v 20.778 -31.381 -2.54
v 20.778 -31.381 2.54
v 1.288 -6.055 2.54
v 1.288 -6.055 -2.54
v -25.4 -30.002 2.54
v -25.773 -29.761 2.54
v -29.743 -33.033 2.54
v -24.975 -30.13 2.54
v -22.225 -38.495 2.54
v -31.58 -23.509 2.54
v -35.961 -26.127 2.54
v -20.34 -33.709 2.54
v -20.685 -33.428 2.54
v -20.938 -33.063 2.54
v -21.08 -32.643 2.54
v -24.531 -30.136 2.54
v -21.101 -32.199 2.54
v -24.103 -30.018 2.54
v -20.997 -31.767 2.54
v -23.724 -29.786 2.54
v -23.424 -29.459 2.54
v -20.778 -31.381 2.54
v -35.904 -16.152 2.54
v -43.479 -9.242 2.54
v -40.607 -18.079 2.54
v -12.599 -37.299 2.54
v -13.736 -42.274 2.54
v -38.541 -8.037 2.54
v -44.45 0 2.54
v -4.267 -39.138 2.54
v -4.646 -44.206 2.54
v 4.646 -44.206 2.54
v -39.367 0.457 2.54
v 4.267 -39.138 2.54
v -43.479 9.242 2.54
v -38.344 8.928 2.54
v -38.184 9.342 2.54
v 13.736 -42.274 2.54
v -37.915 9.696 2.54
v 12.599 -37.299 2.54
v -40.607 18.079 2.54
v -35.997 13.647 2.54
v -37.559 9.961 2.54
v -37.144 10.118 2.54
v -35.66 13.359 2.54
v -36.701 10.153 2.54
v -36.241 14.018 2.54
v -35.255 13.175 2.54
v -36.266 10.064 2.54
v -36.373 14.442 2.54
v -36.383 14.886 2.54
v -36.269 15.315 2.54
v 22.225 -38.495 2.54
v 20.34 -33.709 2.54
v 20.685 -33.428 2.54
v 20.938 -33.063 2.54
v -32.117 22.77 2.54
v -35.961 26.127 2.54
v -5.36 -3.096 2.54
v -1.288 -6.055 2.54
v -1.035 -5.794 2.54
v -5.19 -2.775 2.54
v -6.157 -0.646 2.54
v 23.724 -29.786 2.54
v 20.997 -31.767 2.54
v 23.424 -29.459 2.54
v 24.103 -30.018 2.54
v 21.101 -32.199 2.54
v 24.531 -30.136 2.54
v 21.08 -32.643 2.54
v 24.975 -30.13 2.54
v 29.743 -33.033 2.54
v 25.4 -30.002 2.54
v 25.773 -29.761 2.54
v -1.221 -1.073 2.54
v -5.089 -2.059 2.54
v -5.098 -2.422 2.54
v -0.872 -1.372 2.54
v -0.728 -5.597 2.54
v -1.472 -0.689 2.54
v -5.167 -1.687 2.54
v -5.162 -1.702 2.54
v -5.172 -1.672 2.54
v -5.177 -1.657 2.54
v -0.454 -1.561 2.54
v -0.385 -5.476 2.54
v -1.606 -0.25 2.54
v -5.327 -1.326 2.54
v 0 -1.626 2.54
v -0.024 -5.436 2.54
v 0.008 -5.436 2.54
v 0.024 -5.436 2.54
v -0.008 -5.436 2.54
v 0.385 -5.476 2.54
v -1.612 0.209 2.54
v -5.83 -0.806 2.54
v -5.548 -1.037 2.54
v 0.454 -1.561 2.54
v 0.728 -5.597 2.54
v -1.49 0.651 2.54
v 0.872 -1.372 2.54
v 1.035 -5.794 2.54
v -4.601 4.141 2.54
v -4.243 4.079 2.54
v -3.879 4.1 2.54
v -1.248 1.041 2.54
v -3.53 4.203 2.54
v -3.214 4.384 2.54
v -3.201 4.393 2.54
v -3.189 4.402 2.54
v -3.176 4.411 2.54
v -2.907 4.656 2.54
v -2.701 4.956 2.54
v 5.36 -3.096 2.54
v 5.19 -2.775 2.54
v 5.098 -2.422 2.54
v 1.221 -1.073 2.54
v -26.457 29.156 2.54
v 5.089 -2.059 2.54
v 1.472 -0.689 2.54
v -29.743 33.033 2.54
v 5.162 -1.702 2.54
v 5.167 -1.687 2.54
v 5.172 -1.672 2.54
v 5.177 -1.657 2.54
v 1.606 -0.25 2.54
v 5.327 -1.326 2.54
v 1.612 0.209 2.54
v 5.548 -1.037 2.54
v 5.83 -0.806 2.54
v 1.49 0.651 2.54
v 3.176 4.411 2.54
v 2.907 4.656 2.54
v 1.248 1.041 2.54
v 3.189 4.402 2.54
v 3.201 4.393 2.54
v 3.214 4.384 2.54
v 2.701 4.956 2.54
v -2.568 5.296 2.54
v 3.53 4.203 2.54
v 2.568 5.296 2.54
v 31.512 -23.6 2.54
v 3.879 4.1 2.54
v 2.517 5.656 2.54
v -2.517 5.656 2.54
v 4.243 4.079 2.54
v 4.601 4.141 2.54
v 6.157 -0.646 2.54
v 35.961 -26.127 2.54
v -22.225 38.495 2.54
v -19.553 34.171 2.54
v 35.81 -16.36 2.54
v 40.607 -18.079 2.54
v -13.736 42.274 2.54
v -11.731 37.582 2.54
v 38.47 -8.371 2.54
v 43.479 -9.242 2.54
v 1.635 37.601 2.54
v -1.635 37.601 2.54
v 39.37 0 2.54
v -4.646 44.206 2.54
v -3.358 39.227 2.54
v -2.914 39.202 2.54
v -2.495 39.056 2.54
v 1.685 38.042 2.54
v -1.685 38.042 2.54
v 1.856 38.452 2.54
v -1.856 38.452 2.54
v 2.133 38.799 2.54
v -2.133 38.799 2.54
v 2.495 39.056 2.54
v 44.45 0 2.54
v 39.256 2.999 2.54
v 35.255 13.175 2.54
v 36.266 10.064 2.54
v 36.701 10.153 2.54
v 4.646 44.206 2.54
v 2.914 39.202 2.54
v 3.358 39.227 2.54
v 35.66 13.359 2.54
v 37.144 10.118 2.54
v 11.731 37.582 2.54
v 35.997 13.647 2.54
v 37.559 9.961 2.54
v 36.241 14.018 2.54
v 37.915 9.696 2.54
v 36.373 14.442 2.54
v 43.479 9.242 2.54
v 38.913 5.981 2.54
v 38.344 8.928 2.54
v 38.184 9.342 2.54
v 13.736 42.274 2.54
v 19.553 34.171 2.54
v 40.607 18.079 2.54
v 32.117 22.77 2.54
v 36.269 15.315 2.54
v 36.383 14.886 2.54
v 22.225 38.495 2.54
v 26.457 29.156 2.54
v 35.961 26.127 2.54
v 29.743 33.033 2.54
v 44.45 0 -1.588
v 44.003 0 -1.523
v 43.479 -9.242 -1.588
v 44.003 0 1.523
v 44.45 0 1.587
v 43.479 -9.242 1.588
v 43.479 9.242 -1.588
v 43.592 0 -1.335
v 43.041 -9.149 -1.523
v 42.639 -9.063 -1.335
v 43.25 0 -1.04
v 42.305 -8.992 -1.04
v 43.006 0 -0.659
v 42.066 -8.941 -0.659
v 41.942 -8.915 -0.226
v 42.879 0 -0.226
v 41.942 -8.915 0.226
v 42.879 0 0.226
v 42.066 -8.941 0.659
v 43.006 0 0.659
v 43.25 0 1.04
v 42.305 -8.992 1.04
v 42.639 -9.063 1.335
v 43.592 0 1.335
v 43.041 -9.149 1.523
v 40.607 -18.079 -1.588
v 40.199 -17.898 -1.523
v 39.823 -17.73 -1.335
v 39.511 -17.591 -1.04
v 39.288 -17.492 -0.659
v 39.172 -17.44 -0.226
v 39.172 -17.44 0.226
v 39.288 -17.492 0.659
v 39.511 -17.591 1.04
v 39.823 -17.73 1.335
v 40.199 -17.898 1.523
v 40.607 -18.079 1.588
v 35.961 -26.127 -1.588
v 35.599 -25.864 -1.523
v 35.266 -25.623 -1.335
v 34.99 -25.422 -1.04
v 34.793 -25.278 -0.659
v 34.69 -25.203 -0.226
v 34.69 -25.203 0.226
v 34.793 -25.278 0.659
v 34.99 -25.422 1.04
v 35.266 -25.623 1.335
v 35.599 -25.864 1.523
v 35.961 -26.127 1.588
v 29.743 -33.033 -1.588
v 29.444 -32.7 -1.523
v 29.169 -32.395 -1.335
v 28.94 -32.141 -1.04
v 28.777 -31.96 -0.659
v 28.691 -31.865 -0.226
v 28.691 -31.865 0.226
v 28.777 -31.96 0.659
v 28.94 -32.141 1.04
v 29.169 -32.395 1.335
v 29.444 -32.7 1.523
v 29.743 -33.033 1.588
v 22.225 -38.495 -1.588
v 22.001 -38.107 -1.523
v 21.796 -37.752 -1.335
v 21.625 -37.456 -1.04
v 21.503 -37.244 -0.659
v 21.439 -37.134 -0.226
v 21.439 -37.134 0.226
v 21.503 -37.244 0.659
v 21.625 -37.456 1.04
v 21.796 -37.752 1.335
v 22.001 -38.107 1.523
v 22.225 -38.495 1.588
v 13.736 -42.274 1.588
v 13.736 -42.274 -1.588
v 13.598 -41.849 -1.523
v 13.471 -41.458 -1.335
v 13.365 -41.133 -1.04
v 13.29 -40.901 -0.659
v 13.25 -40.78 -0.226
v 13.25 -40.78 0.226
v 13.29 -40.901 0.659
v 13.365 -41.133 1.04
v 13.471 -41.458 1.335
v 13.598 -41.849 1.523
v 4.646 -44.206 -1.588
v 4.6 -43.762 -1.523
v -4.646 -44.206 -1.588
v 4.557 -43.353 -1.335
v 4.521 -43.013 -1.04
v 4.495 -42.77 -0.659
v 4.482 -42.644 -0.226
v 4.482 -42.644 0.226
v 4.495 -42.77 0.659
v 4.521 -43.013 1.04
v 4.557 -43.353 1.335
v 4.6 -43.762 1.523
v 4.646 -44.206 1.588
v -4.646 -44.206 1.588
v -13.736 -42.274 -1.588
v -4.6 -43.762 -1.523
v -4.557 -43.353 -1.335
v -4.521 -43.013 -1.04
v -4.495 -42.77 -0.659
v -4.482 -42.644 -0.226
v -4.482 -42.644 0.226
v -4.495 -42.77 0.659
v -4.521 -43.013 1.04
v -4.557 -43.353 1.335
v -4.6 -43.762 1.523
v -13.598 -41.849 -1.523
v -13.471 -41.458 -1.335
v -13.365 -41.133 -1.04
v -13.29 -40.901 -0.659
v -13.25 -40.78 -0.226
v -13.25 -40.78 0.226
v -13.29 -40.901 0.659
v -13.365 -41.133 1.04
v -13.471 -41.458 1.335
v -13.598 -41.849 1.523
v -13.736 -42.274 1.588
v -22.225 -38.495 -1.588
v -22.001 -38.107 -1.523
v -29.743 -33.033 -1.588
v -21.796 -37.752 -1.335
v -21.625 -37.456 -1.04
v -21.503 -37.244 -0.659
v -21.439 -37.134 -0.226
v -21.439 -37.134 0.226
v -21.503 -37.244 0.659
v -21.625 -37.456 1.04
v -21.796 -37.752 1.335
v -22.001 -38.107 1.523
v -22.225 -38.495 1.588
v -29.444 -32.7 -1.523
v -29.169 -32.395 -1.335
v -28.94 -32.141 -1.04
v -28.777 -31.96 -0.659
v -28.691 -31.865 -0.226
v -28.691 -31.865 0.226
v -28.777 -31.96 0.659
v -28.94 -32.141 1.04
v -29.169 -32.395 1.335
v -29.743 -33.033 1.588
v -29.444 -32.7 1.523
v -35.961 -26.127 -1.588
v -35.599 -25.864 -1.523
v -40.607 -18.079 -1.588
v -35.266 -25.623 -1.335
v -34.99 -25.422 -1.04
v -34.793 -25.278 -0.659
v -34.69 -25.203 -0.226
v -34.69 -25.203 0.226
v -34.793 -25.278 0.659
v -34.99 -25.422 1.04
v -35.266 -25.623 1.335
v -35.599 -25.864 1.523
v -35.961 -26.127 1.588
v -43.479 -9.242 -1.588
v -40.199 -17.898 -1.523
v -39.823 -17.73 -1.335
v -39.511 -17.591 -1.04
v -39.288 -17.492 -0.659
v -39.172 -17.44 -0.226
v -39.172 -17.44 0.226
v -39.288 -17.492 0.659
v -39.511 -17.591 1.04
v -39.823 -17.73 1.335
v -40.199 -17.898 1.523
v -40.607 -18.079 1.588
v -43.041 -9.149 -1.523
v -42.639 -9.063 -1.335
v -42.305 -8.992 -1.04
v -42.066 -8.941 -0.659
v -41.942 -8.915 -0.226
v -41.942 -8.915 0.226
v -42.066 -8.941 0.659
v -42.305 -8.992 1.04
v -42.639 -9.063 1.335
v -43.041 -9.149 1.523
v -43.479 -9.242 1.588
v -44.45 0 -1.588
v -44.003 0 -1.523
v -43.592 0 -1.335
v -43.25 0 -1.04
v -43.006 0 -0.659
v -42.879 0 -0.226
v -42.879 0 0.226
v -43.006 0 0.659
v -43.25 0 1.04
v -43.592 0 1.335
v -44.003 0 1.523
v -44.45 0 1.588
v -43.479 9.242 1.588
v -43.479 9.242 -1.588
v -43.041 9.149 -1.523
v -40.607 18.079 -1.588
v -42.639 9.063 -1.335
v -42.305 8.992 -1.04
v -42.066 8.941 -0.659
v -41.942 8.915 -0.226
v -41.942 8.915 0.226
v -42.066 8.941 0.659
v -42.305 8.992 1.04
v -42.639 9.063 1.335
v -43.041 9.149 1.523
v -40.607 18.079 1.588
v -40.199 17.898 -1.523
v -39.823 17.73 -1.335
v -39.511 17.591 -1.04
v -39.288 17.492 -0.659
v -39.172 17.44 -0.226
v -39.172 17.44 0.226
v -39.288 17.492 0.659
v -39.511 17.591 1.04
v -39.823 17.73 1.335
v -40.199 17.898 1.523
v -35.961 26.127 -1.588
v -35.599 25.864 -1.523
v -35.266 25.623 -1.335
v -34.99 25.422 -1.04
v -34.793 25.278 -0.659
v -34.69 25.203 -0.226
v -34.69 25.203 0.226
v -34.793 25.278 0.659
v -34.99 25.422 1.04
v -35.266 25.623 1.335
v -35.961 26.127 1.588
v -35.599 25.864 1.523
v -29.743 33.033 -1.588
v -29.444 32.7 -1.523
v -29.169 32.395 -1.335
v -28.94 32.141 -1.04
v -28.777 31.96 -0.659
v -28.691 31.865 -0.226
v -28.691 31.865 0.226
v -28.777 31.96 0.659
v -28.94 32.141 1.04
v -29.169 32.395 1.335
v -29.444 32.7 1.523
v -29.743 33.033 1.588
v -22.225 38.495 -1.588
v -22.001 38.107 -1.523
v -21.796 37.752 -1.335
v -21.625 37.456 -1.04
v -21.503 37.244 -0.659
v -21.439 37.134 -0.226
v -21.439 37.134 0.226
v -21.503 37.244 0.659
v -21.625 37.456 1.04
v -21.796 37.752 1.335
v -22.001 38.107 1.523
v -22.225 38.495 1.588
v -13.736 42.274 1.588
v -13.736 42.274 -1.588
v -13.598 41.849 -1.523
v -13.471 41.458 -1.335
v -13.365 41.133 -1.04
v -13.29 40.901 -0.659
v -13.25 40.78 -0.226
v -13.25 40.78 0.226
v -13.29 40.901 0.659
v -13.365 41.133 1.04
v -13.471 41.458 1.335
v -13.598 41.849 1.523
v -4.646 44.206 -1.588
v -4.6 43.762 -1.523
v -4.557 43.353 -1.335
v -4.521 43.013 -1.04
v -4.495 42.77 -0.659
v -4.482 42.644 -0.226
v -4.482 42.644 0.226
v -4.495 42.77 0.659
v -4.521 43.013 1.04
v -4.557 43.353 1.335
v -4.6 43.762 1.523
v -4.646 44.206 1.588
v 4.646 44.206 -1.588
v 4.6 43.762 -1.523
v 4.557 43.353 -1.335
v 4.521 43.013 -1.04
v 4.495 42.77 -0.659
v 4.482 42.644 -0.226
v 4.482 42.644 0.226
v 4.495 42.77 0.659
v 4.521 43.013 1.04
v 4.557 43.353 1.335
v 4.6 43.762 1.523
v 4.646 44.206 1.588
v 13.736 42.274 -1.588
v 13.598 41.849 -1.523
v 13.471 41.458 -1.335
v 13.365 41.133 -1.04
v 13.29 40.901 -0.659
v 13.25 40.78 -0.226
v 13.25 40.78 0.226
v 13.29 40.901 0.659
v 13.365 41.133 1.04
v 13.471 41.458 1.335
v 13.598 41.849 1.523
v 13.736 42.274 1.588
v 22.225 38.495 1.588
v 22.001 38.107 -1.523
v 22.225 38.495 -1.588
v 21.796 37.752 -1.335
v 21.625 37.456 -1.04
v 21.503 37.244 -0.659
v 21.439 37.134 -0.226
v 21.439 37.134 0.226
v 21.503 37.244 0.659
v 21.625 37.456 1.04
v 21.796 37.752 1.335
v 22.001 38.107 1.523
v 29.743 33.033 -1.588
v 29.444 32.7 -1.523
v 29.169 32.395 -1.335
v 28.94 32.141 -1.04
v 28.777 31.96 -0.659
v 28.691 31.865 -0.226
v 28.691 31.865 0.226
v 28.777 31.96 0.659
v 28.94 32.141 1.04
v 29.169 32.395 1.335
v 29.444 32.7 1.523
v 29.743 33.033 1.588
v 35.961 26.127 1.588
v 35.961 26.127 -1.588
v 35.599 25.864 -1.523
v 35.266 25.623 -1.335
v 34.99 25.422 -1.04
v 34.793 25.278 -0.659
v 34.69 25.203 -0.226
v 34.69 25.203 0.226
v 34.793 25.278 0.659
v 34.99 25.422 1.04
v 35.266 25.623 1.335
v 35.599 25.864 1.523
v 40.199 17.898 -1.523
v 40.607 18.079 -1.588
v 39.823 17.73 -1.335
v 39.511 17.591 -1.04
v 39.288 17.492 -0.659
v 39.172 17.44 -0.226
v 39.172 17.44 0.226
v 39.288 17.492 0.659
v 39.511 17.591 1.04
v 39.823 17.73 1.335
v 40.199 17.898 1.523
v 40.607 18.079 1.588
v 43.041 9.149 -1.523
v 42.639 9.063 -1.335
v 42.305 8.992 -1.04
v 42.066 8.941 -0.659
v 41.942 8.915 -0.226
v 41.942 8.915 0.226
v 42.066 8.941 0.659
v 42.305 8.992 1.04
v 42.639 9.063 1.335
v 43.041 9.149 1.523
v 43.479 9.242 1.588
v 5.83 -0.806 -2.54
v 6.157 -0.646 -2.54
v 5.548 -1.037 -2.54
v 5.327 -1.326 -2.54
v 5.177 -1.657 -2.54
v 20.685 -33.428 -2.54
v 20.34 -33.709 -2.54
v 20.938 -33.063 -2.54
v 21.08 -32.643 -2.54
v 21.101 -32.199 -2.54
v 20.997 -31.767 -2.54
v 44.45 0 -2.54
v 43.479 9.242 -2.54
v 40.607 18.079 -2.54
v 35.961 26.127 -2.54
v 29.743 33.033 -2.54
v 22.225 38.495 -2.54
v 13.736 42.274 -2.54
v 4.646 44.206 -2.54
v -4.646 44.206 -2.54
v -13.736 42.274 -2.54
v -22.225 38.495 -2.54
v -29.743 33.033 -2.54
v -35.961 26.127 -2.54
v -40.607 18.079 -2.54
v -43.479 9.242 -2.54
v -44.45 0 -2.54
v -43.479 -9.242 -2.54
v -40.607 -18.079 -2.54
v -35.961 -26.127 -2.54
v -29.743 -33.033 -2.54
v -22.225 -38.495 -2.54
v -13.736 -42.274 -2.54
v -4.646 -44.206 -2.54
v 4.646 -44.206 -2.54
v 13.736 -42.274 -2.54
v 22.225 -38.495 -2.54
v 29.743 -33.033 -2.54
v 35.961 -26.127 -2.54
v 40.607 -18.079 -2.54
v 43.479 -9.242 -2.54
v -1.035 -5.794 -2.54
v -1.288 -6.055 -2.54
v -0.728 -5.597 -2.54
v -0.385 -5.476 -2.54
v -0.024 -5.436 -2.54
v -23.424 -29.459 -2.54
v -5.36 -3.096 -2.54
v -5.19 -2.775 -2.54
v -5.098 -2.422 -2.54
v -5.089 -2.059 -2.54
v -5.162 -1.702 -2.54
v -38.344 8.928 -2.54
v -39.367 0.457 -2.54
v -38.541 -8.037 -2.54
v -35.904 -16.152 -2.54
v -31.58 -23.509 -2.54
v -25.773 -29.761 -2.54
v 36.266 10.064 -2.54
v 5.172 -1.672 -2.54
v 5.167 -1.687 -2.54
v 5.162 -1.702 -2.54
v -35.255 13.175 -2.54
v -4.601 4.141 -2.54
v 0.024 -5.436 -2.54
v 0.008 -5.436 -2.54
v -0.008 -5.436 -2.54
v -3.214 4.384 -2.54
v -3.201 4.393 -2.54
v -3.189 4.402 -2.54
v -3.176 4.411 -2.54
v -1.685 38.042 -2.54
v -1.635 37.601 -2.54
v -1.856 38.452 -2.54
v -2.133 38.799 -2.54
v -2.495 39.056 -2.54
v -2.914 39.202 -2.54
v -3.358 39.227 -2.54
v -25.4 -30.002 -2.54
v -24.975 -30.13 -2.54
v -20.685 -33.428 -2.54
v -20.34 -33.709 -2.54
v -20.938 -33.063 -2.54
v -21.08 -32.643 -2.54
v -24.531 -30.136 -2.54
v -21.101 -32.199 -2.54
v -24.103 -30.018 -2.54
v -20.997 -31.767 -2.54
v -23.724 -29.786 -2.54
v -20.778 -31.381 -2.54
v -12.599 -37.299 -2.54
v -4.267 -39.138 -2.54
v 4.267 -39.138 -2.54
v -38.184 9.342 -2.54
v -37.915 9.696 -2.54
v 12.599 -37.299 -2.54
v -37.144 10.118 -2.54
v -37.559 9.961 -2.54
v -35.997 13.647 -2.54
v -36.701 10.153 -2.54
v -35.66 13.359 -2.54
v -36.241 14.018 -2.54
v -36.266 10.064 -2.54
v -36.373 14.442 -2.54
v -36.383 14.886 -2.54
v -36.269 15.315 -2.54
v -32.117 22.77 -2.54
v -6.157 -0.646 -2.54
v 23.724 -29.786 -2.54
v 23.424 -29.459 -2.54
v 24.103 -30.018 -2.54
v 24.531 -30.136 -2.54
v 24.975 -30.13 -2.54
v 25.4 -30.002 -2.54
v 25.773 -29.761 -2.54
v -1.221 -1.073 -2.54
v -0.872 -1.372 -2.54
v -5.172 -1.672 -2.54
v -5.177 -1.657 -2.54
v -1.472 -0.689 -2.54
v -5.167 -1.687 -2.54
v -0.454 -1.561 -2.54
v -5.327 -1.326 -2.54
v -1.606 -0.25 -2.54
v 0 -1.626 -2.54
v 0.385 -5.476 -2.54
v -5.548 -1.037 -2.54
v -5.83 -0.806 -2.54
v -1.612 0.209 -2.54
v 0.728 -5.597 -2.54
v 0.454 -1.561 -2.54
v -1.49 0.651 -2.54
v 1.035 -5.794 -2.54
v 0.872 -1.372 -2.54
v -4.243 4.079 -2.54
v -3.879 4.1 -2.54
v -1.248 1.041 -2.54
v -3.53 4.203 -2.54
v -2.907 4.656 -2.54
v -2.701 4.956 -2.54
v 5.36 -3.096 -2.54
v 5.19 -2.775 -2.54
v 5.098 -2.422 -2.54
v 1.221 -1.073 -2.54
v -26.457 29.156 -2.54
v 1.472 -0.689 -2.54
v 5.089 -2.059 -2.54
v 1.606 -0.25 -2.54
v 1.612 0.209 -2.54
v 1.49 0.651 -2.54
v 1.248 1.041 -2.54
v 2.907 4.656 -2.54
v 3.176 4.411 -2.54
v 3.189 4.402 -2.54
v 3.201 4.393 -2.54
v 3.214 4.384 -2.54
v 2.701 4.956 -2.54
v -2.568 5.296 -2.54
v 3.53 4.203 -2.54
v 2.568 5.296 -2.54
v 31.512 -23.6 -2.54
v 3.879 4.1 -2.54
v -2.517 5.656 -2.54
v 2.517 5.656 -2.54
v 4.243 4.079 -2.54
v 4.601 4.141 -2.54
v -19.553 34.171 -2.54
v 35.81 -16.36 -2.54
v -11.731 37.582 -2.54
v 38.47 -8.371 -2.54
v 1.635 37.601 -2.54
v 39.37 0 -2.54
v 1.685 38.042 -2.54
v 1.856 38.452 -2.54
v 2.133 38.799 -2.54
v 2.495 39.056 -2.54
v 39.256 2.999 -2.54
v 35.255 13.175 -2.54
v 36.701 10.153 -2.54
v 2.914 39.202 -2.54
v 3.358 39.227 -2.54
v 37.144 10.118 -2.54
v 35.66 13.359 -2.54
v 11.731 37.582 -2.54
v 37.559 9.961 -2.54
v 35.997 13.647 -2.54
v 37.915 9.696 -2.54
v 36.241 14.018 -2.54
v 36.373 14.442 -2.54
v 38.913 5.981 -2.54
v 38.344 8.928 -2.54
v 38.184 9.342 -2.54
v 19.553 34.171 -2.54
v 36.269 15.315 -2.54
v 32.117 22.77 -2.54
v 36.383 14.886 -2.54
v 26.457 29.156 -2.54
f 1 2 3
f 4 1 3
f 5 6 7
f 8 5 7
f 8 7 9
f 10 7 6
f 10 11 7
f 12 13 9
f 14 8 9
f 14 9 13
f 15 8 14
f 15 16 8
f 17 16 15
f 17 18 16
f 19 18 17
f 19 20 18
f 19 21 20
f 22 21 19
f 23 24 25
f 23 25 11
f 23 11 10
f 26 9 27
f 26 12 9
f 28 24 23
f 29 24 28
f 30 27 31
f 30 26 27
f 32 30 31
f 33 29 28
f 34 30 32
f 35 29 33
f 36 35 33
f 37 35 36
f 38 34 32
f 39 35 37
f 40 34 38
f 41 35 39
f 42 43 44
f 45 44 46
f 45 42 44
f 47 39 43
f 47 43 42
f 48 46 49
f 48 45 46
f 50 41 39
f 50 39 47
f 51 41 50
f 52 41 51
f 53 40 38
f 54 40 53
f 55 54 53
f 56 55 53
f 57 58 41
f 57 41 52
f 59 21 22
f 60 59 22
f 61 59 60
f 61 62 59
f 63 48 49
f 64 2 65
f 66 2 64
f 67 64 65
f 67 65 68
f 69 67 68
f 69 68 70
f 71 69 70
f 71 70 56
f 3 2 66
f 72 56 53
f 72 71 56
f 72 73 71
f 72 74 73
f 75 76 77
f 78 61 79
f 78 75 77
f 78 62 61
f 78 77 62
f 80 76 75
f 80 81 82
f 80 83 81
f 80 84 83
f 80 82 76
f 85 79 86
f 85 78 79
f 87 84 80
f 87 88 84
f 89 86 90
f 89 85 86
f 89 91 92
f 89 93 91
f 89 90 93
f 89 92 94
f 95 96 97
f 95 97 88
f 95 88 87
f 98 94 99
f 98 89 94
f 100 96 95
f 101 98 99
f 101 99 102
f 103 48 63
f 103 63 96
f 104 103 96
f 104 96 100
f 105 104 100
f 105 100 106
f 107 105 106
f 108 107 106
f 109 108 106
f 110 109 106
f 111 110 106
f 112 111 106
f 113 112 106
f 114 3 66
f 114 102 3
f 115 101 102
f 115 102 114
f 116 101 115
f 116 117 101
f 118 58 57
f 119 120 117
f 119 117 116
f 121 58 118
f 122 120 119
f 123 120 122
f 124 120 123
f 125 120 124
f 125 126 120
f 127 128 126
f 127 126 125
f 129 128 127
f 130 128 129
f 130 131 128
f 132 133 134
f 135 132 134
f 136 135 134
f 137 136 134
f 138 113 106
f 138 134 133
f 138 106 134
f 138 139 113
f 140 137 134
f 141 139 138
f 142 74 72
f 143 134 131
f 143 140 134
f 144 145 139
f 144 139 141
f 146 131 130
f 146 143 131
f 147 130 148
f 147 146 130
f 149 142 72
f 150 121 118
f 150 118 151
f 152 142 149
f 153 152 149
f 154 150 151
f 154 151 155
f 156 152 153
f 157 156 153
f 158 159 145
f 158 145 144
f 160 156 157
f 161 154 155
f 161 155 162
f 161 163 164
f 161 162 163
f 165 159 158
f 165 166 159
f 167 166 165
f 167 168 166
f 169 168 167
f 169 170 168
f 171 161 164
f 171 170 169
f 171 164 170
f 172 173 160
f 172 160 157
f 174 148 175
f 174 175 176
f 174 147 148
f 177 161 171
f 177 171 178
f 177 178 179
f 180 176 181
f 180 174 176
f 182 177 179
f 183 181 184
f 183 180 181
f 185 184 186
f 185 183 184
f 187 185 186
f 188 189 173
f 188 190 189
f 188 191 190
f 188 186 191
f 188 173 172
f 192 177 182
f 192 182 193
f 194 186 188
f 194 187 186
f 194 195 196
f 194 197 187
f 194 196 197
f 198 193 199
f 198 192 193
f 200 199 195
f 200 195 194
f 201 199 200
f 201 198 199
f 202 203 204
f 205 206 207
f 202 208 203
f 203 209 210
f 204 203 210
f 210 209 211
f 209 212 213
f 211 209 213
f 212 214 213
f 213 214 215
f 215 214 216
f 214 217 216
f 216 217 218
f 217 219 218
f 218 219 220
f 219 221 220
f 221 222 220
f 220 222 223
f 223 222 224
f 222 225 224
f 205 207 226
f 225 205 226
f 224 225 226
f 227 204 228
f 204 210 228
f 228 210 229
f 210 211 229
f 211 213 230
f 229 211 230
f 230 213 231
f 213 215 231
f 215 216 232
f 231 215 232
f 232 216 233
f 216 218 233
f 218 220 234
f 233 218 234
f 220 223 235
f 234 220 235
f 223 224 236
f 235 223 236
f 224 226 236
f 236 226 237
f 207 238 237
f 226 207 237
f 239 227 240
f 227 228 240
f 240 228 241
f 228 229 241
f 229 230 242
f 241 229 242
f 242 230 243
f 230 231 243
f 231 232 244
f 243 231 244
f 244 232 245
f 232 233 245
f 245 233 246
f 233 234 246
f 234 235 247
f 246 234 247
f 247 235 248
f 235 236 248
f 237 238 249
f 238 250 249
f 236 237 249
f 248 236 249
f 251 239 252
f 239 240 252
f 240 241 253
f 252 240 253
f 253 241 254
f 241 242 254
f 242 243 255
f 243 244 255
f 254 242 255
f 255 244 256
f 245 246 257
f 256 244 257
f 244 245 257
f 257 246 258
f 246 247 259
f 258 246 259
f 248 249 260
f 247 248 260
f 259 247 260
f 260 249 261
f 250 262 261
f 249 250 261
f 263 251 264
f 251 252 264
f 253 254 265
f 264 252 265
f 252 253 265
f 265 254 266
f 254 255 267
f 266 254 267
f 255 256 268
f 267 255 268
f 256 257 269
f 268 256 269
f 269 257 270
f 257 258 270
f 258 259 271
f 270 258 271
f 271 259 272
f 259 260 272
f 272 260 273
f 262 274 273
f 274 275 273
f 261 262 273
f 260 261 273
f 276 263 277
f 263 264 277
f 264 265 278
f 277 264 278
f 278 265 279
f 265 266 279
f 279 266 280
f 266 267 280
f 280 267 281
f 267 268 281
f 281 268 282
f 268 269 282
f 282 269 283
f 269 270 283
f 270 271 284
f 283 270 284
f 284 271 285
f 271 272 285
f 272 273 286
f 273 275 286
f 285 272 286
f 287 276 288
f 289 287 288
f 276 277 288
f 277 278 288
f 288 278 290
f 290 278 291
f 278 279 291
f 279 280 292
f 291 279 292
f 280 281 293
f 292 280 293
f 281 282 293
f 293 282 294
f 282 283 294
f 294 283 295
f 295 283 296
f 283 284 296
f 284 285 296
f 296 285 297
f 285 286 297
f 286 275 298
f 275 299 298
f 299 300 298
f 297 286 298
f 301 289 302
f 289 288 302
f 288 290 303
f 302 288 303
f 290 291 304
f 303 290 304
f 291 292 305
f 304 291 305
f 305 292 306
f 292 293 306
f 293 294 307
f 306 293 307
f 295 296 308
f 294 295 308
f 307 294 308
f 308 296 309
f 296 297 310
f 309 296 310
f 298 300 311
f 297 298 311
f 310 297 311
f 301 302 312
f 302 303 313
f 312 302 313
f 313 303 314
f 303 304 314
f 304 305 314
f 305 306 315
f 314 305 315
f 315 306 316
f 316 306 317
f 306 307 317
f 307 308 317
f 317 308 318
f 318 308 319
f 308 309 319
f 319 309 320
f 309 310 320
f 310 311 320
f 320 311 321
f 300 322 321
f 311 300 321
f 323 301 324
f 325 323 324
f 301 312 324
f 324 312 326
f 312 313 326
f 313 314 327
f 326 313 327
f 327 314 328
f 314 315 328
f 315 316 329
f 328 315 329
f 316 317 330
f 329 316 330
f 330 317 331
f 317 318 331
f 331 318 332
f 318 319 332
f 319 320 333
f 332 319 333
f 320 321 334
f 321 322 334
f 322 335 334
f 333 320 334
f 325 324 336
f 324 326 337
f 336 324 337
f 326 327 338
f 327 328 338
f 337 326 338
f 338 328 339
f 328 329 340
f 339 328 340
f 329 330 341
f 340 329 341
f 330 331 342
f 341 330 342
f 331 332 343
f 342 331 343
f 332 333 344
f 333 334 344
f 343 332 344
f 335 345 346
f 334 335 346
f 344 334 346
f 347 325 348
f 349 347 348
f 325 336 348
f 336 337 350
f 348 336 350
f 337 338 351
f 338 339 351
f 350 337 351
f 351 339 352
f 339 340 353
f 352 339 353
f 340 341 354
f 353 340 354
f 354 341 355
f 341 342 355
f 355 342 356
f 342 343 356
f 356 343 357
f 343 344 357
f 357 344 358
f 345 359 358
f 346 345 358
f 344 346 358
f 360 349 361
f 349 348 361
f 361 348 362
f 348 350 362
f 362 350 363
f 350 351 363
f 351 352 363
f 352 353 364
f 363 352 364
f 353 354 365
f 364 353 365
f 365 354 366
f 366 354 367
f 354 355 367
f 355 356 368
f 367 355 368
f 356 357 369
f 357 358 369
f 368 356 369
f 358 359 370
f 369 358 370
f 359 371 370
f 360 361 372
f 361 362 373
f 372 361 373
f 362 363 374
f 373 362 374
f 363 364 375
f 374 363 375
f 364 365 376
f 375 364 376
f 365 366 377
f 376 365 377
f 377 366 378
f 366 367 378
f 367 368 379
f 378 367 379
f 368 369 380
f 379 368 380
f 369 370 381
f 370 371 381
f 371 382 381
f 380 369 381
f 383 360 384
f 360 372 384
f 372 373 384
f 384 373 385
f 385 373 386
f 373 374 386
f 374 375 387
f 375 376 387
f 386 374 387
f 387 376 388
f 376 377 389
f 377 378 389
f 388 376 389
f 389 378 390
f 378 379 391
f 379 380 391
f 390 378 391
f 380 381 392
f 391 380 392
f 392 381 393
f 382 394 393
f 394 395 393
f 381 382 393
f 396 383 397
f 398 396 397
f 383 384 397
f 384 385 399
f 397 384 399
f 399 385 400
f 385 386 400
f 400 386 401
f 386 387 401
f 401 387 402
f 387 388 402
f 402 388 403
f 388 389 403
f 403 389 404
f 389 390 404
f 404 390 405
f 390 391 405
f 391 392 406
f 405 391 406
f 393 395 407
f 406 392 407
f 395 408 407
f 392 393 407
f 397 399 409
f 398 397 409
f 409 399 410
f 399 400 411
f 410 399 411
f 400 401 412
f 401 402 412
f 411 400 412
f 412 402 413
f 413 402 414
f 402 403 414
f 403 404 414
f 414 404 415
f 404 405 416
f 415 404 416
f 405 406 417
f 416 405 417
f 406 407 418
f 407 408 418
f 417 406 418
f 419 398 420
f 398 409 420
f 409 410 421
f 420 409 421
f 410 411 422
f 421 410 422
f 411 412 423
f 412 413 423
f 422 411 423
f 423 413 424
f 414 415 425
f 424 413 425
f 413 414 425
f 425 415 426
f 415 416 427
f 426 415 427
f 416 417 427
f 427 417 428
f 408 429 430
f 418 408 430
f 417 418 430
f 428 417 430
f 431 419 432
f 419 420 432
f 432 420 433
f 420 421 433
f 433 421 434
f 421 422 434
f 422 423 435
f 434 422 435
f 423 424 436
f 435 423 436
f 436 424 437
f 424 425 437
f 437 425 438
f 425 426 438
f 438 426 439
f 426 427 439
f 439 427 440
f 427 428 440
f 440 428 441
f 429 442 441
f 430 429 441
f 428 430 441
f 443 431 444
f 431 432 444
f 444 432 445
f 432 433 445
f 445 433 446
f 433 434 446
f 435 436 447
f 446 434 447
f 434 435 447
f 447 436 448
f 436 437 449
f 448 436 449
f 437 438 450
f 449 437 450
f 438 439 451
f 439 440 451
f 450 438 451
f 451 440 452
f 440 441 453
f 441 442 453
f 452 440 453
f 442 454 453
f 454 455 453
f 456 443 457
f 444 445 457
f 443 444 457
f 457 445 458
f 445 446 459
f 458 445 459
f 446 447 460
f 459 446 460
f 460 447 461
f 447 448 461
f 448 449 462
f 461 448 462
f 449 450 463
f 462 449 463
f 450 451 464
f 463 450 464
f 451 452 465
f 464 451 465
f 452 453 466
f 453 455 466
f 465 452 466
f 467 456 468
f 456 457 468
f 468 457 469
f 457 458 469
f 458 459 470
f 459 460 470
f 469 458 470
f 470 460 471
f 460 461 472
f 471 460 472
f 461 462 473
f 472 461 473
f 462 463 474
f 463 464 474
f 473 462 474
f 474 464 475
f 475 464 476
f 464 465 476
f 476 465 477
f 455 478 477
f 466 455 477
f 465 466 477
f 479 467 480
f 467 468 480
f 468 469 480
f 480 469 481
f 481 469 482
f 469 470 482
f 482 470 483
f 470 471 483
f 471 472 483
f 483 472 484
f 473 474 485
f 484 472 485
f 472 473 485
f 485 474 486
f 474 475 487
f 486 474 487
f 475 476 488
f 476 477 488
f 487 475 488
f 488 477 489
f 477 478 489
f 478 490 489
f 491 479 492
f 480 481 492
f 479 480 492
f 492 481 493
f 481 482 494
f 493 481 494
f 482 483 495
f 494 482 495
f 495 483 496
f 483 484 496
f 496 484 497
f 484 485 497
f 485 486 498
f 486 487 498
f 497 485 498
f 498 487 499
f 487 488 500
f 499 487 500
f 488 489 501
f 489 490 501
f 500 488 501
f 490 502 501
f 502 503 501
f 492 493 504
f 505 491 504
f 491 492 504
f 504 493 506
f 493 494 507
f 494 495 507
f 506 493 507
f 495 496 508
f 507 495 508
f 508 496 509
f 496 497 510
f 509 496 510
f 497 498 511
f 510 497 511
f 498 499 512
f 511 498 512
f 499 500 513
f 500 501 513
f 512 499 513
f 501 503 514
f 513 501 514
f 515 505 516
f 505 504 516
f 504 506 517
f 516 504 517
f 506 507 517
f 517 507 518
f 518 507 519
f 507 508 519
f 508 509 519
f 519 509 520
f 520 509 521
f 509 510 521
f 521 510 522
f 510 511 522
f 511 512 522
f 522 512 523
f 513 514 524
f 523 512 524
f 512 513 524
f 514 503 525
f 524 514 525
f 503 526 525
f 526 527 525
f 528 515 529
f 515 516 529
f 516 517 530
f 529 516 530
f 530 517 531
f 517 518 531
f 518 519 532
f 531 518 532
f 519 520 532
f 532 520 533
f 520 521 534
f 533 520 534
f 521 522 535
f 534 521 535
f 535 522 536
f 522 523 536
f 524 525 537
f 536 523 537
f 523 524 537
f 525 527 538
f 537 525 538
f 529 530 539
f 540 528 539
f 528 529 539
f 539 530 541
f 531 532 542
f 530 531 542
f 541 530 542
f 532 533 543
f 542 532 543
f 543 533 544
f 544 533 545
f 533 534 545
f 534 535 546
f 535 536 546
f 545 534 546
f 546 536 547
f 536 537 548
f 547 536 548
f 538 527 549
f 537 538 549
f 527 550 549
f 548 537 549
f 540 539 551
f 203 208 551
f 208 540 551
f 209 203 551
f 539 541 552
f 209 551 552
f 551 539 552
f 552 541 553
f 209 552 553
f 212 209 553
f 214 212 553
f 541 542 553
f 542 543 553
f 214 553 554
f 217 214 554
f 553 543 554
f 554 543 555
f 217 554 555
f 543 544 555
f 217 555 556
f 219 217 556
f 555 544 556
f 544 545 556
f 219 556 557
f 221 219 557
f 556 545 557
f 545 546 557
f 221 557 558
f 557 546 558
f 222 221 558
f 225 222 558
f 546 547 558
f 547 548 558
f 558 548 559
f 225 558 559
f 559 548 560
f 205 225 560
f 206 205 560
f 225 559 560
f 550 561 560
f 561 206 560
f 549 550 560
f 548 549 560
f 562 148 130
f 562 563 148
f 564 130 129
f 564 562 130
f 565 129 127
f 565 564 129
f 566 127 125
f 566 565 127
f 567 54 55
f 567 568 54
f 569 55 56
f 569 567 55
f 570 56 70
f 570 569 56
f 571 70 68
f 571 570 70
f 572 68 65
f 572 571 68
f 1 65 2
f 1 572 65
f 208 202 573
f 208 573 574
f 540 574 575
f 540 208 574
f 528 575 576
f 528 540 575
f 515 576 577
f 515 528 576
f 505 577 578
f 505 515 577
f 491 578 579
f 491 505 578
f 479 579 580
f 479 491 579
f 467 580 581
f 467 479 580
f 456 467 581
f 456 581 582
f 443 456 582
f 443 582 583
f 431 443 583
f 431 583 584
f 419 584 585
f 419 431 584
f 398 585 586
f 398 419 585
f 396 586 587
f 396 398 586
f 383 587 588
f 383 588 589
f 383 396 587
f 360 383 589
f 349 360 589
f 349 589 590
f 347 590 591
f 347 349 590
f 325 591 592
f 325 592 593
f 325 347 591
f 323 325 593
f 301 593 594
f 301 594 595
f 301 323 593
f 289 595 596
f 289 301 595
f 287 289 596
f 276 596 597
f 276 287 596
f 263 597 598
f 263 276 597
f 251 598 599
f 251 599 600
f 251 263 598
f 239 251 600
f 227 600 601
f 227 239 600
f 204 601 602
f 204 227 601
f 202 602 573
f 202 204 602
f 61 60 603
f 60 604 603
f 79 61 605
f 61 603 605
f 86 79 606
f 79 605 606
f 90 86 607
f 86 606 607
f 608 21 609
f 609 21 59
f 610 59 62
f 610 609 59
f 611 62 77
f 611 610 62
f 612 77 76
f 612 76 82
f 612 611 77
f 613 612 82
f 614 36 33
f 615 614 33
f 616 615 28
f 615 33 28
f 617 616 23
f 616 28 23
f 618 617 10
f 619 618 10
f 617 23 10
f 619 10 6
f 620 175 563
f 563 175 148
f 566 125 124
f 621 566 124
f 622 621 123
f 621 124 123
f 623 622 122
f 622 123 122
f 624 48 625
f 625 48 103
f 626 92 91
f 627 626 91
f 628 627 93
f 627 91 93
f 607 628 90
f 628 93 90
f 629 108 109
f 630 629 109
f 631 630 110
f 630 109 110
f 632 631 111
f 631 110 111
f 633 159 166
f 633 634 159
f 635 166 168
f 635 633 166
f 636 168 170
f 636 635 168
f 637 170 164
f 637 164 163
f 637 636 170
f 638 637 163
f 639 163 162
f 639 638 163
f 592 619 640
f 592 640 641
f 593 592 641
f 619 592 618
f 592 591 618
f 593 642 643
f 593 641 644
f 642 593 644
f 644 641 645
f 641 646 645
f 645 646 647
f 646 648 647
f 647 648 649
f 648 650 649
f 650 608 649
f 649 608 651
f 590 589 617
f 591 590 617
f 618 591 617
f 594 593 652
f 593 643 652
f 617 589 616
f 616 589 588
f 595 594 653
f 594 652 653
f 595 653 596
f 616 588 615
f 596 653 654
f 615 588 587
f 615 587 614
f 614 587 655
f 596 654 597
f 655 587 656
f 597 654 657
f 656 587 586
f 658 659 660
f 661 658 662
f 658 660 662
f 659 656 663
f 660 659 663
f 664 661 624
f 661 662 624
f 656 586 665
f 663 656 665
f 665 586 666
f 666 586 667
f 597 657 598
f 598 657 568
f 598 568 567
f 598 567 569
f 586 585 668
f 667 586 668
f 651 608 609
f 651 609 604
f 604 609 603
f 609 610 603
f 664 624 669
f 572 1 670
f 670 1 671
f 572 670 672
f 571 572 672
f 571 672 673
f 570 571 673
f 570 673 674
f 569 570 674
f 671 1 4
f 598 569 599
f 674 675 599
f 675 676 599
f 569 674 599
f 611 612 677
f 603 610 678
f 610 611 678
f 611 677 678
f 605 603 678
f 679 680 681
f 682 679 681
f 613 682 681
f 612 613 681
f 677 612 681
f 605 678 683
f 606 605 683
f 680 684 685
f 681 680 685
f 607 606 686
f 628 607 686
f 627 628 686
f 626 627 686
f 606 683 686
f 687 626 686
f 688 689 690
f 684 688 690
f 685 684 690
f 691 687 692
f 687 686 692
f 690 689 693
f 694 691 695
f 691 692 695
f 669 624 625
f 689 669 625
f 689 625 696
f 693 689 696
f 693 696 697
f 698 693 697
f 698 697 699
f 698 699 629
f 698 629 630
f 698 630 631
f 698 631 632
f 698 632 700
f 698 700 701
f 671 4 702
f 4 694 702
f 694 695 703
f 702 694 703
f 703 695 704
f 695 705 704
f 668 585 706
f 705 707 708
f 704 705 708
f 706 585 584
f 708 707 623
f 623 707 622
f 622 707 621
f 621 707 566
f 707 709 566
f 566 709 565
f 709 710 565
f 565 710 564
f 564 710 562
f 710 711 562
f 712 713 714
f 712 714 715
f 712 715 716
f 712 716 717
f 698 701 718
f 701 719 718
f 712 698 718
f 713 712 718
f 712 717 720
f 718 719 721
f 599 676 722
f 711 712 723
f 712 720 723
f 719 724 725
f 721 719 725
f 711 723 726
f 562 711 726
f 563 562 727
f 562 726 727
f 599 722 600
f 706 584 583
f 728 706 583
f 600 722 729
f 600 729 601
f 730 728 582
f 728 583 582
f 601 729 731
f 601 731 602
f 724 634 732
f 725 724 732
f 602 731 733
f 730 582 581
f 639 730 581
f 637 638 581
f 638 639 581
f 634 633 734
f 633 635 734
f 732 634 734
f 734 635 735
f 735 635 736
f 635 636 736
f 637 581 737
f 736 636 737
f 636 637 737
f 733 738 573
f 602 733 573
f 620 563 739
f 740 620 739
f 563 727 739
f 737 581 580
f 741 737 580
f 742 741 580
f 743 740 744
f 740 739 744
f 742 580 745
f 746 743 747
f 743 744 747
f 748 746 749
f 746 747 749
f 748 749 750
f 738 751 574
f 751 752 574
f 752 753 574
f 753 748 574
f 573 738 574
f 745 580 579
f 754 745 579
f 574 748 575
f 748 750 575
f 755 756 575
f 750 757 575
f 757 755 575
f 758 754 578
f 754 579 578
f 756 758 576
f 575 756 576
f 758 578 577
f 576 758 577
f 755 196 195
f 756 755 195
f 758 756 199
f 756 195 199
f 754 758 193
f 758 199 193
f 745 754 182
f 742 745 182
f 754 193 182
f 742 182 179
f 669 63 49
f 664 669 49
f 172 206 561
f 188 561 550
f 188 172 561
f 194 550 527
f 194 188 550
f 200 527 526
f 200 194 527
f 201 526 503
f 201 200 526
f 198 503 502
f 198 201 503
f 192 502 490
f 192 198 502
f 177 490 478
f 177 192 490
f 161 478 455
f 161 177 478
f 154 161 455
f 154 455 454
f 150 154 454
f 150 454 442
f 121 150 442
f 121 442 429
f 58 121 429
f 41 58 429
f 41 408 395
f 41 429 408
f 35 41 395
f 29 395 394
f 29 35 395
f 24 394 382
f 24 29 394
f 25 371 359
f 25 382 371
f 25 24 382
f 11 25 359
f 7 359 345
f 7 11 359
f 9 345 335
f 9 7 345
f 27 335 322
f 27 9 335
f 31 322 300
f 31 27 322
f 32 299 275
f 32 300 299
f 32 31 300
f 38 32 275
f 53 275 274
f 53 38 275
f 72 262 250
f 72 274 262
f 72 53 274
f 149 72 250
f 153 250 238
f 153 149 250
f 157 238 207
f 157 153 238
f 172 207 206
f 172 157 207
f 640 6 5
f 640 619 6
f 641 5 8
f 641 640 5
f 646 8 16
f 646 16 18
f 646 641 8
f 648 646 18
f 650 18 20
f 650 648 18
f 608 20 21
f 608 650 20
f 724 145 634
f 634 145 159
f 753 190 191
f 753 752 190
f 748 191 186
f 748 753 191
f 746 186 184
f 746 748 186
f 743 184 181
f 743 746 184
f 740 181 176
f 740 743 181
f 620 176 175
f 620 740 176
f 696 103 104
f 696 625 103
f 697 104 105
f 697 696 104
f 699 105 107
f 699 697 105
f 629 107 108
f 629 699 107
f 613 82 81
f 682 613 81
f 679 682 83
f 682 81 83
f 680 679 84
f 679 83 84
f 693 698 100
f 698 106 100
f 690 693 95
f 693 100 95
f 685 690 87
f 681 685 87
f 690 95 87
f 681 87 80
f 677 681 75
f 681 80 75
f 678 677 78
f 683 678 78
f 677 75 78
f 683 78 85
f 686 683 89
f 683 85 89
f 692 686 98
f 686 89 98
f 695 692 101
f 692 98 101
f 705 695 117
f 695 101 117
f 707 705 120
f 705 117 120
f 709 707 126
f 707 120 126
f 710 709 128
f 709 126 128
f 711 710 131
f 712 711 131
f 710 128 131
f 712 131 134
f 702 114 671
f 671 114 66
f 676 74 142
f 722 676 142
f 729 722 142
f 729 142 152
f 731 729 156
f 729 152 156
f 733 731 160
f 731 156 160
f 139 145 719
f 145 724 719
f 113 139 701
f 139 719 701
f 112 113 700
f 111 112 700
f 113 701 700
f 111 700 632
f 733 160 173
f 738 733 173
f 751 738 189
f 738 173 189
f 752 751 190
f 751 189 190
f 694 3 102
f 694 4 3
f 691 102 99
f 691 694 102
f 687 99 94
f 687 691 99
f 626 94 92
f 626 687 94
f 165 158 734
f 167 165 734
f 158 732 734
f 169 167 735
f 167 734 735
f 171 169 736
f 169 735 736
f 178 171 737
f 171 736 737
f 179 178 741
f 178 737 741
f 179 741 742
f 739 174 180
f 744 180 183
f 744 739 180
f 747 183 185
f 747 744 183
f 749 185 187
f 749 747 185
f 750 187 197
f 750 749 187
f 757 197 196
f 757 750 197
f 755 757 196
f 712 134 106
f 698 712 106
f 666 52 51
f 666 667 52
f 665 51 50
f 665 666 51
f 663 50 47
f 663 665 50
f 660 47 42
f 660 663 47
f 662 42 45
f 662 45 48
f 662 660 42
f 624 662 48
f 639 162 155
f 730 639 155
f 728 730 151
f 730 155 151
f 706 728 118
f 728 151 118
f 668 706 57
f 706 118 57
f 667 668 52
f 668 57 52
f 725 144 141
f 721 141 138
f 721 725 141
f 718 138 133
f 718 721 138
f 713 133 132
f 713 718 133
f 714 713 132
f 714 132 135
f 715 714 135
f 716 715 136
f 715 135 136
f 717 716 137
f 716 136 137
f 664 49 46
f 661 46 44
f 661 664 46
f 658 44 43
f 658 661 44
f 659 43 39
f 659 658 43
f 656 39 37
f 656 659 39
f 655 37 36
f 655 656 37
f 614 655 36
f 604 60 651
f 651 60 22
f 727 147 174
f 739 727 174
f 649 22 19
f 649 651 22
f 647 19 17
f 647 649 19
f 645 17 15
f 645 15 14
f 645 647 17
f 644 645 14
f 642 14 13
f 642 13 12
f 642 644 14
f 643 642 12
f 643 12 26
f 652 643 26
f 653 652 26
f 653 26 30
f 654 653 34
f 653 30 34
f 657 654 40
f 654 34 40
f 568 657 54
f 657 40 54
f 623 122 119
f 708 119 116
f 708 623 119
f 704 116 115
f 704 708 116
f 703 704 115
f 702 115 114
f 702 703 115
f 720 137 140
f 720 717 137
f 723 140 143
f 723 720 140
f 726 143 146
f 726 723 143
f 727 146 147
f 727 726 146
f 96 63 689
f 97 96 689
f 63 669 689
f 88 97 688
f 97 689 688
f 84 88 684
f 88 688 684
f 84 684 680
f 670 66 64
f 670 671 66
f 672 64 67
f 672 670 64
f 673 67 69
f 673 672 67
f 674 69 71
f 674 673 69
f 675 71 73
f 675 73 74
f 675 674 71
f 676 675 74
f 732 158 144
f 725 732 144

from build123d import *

# Parameters (mm, degrees)
SKETCH1_R           = 44.45
BOSS_EXTRUDE1_DEPTH = 2.54
SKETCH2_R           = 1.5875
CUT_EXTRUDE1_DEPTH  = 64.066721811
FILLET1_R           = 1.5875


with BuildPart() as part:
    # Sketch1 → Boss-Extrude1 (new, symmetric)
    with BuildSketch(Plane.XY):
        Circle(SKETCH1_R)
        with BuildLine():
            Line((1.248223297, 1.0414), (-1.248223297, 1.0414))
            ThreePointArc((-1.248223297, 1.0414), (0, -1.6256), (1.248223297, 1.0414))
        make_face(mode=Mode.SUBTRACT)
    extrude(amount=BOSS_EXTRUDE1_DEPTH, both=True)

    # Sketch2 → Cut-Revolve1 (revolve, cut)
    with BuildSketch(Plane(origin=(0, 0, 0), x_dir=(1, 0, 0), z_dir=(0, 1, 0))):
        with Locations((44.45, 0)):
            Circle(SKETCH2_R)
    revolve(axis=Axis((0, 0, 0), (0, 0, -1)), mode=Mode.SUBTRACT)

    # Sketch4 → Cut-Extrude1 (cut, through all)
    with BuildSketch(Plane.XY.offset(2.54)):
        with BuildLine():
            ThreePointArc((-3.785529256, 3.900707066), (-3.194965517, 4.397492775), (-2.54, 4.80563704))
            Line((-2.54, 4.80563704), (-1.5875, 39.337980931))
            ThreePointArc((-1.5875, 39.337980931), (-23.141105383, 31.850999069), (-36.922078624, 13.665906852))
            Line((-36.922078624, 13.665906852), (-3.785529256, 3.900707066))
        make_face()
        with BuildLine():
            Line((1.5875, 39.337980931), (2.54, 4.80563704))
            ThreePointArc((2.54, 4.80563704), (3.194965517, 4.397492775), (3.785529256, 3.900707066))
            Line((3.785529256, 3.900707066), (36.922078624, 13.665906852))
            ThreePointArc((36.922078624, 13.665906852), (23.141105383, 31.850999069), (1.5875, 39.337980931))
        make_face()
        with BuildLine():
            ThreePointArc((39.37, 0), (39.001578061, 5.373435471), (37.903207581, 10.646302413))
            Line((37.903207581, 10.646302413), (5.355335588, -0.930660037))
            ThreePointArc((5.355335588, -0.930660037), (5.1695628, -1.679692775), (4.879585746, -2.394867493))
            Line((4.879585746, -2.394867493), (24.406599525, -30.89198601))
            ThreePointArc((24.406599525, -30.89198601), (35.432222082, -17.162591248), (39.37, 0))
        make_face()
        with BuildLine():
            ThreePointArc((0.769779414, -5.380816575), (0, -5.4356), (-0.769779414, -5.380816575))
            Line((-0.769779414, -5.380816575), (-21.837970568, -32.758204186))
            ThreePointArc((-21.837970568, -32.758204186), (0, -39.37), (21.837970568, -32.758204186))
            Line((21.837970568, -32.758204186), (0.769779414, -5.380816575))
        make_face()
        with BuildLine():
            ThreePointArc((-4.879585746, -2.394867493), (-5.1695628, -1.679692775), (-5.355335588, -0.930660037))
            Line((-5.355335588, -0.930660037), (-37.903207581, 10.646302413))
            ThreePointArc((-37.903207581, 10.646302413), (-37.443095047, -12.165999069), (-24.406599525, -30.89198601))
            Line((-24.406599525, -30.89198601), (-4.879585746, -2.394867493))
        make_face()
    extrude(amount=-CUT_EXTRUDE1_DEPTH, mode=Mode.SUBTRACT)

    # Fillet1
    fillet1_edges = [part.edges().sort_by_distance(p)[0] for p in [
        (24.406599525, -30.89198601, 0),
        (4.879585746, -2.394867493, 0),
        (5.355335588, -0.930660037, 0),
        (37.903207581, 10.646302413, 0),
        (36.922078624, 13.665906852, 0),
        (3.785529256, 3.900707066, 0),
        (2.54, 4.80563704, 0),
        (1.5875, 39.337980931, 0),
        (-37.903207581, 10.646302413, 0),
        (-5.355335588, -0.930660037, 0),
        (-4.879585746, -2.394867493, 0),
        (-24.406599525, -30.89198601, 0),
        (-21.837970568, -32.758204186, 0),
        (-0.769779414, -5.380816575, 0),
        (0.769779414, -5.380816575, 0),
        (21.837970568, -32.758204186, 0),
        (-1.5875, 39.337980931, 0),
        (-2.54, 4.80563704, 0),
        (-3.785529256, 3.900707066, 0),
        (-36.922078624, 13.665906852, 0),
    ]]
    fillet(fillet1_edges, radius=FILLET1_R)


solid = part.part
